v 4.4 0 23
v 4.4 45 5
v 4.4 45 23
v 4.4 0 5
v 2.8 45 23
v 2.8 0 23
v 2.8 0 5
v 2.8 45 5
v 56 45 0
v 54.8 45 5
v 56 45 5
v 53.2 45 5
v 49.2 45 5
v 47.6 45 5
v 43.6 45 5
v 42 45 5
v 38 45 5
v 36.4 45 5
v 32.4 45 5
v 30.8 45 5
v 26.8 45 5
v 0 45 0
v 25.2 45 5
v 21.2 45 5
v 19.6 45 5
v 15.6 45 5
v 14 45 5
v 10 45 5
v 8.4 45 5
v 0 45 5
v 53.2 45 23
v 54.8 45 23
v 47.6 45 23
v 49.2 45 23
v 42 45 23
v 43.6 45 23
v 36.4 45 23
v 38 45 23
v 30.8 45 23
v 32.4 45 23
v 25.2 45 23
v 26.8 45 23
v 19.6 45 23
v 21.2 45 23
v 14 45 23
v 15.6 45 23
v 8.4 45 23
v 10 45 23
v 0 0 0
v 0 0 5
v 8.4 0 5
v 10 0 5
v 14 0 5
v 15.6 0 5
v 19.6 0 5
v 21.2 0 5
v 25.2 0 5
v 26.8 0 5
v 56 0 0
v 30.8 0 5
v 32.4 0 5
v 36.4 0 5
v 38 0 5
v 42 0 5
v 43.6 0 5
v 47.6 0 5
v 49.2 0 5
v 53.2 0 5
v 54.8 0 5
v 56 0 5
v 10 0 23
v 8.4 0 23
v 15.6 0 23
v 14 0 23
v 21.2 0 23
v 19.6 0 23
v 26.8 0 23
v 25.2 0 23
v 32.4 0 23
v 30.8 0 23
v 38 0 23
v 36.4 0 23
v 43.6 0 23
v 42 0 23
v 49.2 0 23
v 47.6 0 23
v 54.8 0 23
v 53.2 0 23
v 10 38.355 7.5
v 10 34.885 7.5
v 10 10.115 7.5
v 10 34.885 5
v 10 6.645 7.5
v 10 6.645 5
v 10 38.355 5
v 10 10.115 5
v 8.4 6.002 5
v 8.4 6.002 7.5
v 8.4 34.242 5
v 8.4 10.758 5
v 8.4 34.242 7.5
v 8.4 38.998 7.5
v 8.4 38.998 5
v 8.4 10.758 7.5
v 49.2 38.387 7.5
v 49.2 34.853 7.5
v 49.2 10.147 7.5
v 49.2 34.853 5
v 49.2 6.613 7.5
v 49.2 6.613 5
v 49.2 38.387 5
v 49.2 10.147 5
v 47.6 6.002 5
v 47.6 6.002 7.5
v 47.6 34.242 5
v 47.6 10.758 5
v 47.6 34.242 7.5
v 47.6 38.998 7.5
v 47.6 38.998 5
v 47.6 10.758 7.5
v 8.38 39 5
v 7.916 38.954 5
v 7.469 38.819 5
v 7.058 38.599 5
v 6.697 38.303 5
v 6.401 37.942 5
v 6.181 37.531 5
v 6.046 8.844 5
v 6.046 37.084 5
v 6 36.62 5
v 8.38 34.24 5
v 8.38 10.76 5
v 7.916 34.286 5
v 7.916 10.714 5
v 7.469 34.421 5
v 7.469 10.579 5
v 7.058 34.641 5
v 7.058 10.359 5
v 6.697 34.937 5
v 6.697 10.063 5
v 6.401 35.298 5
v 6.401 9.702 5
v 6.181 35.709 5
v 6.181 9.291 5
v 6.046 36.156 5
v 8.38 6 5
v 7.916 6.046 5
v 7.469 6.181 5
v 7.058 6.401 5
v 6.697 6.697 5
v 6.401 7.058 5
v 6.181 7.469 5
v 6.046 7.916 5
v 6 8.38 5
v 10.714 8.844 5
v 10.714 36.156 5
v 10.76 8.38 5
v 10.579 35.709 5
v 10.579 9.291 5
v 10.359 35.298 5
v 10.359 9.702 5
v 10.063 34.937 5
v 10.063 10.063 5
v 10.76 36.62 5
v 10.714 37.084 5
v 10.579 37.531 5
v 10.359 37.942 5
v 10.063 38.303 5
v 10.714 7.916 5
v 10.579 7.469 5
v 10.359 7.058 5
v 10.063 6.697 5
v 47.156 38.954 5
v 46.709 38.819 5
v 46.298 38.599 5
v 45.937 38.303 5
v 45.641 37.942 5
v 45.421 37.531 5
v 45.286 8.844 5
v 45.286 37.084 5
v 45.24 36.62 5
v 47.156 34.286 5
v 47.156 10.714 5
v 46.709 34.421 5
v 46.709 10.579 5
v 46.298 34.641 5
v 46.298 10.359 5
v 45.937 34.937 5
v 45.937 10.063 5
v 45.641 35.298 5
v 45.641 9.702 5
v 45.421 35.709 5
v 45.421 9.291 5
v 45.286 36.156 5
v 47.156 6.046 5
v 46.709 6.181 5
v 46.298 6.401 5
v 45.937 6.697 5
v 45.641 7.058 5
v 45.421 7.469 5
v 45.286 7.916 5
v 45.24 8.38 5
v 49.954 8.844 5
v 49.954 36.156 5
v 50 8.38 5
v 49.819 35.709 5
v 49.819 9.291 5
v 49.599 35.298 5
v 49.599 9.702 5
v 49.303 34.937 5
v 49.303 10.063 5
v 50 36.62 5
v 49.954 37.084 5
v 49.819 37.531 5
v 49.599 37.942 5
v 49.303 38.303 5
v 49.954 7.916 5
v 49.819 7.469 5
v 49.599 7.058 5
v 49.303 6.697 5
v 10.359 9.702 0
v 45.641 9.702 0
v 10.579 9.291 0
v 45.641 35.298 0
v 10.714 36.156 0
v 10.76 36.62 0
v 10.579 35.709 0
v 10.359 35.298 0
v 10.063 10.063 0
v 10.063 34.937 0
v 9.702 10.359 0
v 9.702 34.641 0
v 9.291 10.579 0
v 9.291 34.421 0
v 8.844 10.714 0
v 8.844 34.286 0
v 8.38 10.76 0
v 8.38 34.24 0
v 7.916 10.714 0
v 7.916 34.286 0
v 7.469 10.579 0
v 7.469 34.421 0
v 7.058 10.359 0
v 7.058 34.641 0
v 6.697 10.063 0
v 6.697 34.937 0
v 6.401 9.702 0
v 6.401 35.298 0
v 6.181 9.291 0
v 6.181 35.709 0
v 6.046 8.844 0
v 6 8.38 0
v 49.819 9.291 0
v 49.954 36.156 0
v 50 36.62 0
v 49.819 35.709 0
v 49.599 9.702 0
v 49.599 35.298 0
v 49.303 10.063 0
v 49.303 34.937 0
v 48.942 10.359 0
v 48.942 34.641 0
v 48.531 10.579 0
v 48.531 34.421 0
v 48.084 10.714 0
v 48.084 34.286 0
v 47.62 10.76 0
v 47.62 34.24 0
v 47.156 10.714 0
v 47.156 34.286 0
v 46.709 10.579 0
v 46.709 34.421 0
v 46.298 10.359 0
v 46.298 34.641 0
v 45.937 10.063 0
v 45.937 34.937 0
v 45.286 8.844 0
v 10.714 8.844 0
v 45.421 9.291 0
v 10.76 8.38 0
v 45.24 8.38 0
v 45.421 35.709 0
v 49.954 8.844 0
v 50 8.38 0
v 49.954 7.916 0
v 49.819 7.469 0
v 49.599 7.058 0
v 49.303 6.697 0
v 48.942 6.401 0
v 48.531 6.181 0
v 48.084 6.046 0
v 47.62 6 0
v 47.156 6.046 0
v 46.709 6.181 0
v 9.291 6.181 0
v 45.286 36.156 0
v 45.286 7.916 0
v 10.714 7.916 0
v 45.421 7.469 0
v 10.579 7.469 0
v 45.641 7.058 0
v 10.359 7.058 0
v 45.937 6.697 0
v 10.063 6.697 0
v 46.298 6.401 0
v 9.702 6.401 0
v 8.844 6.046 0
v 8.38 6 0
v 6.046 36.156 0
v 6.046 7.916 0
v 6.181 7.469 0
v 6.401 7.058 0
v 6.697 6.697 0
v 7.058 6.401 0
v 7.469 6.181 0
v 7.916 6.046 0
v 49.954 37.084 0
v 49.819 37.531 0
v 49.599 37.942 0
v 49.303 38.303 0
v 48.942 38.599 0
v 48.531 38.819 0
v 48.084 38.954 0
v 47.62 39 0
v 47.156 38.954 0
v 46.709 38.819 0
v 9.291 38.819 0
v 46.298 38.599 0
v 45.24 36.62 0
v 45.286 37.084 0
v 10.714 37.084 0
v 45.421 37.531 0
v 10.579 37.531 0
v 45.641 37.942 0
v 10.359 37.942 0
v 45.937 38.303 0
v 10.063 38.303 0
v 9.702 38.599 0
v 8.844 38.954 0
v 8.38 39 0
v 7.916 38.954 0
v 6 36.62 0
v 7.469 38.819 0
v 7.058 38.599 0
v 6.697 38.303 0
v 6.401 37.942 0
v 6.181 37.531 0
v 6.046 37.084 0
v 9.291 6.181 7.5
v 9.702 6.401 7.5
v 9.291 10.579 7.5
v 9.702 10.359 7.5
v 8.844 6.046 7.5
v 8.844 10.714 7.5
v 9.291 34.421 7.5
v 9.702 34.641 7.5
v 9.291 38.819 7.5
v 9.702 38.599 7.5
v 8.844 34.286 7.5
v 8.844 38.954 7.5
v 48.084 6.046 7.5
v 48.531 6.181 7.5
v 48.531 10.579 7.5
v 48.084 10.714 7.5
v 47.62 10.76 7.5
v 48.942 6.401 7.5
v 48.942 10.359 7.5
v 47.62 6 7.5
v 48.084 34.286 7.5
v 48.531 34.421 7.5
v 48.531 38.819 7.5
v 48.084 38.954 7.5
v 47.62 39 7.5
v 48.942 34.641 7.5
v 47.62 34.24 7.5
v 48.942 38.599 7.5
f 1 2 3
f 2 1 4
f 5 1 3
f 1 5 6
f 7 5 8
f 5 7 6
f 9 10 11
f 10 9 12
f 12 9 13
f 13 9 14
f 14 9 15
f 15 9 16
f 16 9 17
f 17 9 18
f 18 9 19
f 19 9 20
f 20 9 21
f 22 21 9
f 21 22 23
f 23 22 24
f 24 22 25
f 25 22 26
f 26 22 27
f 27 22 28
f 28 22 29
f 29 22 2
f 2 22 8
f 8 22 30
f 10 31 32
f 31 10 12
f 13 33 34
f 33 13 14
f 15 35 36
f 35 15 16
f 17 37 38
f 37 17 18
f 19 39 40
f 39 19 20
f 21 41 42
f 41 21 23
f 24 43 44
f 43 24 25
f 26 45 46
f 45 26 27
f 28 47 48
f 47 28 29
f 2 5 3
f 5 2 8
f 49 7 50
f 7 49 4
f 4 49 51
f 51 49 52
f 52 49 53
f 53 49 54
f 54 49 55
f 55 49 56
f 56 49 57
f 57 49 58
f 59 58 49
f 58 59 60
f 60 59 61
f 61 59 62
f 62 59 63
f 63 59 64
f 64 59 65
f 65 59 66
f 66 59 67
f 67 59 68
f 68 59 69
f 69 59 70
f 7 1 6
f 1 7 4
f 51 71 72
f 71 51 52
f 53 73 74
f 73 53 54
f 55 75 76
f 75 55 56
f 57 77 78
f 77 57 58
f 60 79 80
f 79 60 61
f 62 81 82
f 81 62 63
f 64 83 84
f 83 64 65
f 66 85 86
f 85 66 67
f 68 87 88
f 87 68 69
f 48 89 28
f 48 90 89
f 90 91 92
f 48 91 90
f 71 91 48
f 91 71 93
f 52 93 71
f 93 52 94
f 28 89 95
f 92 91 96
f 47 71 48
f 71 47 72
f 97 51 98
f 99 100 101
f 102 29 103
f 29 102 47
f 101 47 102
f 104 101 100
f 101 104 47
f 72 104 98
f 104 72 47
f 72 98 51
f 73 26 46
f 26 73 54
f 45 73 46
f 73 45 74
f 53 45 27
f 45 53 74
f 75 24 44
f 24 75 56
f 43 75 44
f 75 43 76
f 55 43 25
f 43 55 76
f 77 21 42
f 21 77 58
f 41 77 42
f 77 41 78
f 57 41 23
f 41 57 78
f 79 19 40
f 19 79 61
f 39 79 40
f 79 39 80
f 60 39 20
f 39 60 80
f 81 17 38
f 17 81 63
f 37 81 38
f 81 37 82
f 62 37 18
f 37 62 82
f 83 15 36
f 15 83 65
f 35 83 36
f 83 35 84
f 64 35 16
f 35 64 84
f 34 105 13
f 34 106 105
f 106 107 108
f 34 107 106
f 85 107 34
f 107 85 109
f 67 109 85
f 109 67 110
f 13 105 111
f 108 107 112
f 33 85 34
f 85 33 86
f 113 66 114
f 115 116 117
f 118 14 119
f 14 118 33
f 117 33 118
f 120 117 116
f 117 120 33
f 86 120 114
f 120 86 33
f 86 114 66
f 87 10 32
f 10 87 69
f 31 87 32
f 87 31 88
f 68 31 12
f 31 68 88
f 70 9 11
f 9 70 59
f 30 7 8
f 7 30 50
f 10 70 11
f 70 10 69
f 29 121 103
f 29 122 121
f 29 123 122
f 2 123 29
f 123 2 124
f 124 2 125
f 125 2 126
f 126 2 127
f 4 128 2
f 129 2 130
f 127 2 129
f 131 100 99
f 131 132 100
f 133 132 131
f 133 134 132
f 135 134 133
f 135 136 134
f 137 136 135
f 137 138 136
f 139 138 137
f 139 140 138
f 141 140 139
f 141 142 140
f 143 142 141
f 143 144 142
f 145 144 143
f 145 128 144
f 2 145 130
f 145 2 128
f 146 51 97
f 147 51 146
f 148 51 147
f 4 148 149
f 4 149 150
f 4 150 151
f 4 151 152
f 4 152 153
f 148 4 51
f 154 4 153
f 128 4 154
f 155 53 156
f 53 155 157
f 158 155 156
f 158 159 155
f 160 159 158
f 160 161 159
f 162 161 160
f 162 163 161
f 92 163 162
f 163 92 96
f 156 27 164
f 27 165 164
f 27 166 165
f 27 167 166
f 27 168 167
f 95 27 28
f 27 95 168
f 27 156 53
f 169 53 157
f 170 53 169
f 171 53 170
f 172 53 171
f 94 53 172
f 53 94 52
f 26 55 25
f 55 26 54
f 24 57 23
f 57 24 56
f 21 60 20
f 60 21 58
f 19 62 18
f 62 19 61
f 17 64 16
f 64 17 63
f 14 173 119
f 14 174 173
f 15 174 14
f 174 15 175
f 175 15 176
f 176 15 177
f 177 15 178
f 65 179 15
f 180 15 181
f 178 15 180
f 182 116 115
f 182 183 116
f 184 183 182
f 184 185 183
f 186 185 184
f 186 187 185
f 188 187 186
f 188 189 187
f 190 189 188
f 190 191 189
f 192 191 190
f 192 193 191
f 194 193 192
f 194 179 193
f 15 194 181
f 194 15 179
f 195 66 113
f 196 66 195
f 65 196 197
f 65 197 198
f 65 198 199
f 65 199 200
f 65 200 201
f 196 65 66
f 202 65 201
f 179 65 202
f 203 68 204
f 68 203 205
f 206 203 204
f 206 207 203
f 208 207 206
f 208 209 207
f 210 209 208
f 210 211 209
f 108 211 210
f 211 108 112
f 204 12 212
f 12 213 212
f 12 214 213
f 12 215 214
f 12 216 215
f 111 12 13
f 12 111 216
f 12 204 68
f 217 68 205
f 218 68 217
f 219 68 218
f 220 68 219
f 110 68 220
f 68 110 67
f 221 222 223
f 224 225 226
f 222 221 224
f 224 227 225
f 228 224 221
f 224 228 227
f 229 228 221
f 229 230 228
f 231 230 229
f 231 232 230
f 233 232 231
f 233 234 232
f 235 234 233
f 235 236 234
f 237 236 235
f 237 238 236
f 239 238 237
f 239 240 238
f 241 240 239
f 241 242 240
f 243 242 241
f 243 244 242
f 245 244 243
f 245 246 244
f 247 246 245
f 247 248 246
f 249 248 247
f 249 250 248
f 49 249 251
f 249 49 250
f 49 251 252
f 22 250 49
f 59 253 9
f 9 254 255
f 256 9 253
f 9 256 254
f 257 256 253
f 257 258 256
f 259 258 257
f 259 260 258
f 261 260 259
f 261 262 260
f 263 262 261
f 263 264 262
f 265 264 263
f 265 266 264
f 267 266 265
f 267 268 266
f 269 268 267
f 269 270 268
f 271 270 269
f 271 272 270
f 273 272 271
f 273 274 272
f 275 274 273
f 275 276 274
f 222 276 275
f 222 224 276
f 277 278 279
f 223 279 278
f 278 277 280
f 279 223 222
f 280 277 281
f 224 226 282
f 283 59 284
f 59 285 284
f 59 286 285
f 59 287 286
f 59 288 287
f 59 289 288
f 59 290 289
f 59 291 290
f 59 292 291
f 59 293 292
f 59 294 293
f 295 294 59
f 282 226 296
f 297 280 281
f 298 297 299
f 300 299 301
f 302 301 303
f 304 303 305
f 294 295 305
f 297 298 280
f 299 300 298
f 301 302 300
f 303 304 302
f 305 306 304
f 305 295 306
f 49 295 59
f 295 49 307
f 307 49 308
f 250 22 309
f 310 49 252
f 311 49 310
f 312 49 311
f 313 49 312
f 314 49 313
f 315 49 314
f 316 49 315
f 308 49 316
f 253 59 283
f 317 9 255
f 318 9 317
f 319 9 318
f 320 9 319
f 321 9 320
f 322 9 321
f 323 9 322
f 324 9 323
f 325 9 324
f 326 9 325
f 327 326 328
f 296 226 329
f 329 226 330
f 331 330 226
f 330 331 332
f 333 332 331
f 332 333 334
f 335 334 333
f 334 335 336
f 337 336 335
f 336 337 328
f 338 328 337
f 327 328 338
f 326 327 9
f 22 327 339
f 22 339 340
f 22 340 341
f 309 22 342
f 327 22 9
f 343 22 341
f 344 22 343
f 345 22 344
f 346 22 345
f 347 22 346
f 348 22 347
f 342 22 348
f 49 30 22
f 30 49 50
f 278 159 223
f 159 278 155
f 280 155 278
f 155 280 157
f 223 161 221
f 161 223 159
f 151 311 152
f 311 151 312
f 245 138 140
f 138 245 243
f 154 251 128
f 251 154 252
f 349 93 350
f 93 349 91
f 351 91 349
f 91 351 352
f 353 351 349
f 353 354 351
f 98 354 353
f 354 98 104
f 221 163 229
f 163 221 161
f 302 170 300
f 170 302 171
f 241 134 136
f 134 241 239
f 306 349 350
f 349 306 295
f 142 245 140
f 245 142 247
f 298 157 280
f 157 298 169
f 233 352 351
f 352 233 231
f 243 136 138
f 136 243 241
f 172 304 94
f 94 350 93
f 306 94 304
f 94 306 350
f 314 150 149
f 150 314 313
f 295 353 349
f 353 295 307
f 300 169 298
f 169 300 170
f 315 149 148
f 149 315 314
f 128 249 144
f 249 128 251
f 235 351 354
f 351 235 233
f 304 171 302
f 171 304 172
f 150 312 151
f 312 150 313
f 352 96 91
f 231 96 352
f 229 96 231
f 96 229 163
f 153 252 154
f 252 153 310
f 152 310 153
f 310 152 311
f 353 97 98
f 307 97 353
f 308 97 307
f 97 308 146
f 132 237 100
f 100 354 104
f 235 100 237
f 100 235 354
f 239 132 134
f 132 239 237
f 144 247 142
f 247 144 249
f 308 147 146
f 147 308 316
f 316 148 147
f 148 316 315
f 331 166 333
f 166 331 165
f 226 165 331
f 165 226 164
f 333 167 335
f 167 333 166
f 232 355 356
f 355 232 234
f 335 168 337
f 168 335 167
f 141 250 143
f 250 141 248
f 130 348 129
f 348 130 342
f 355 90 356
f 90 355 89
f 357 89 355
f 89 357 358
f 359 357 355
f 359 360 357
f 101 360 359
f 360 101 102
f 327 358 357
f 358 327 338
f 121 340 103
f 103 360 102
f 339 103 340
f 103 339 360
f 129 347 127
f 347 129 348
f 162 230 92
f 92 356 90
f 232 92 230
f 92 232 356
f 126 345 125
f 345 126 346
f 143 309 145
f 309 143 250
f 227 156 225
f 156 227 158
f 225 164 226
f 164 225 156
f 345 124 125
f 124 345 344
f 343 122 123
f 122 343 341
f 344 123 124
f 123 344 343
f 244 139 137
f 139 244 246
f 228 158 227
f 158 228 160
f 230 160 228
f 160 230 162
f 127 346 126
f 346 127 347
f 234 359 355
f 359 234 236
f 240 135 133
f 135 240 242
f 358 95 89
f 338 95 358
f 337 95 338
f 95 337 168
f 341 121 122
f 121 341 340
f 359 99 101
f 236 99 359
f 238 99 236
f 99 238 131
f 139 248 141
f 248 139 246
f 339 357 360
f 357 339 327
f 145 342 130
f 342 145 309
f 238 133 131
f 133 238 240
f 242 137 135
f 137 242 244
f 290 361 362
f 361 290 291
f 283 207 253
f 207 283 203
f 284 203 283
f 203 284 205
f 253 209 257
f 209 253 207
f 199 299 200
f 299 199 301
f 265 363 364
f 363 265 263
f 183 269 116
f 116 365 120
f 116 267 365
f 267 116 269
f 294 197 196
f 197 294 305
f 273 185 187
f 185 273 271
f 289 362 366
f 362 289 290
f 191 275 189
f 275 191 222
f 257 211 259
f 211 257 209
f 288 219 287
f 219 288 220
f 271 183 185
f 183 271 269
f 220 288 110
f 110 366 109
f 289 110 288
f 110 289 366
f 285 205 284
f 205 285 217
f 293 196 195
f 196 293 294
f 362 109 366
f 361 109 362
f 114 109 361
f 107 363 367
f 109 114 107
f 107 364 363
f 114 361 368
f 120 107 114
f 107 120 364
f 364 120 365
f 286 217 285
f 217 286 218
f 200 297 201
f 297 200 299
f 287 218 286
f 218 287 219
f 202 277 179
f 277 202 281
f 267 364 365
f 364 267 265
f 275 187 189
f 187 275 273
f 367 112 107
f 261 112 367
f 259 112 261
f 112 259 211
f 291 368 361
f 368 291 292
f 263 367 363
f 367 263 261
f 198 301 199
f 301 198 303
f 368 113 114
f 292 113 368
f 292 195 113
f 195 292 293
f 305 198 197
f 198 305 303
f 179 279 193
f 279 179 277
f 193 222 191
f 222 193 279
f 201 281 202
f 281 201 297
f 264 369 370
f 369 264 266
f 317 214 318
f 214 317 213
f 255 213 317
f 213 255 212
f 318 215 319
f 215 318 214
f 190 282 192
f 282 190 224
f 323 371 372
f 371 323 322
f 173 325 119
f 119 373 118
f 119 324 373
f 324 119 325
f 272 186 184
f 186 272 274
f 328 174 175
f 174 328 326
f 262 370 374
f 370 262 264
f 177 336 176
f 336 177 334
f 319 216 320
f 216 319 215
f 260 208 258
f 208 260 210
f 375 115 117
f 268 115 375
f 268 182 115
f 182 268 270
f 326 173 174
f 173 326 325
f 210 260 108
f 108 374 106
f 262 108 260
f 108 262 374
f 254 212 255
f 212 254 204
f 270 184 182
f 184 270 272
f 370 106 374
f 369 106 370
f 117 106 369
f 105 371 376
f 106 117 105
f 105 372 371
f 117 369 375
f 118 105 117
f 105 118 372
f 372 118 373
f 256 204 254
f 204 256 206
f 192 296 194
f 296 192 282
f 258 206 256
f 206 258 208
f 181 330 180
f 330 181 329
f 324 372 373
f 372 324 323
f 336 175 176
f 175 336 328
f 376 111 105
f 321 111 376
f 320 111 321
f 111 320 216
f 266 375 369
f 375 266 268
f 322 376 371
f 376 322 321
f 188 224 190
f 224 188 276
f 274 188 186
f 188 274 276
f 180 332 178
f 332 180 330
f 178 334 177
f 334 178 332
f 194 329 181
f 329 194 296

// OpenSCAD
$fn = 32;

// ----------------------------------------------------------------------
// Finned heat sink: 56 x 45 mm base, 18 mm fins
// ----------------------------------------------------------------------

// --- parameters (mm) ---
base_w = 56;              // base width
base_d = 45;              // base depth
base_t = 5;               // base thickness
fin_h = 18;               // fin height above the base
holes_d = 4.76;           // fixing holes
hole_x = 19.62;           // hole offset in x
hole_y = 14.12;           // hole offset in y
fin_t = 1.6;              // fin thickness
fin_pitch = 5.6;          // fin pitch
fin_count = 10;           // number of fins
fin_x0 = 2.8;             // first fin offset

difference() {
  union() {
    cube([base_w, base_d, base_t]);
    for (i = [0 : fin_count - 1]) {
      translate([fin_x0 + i * fin_pitch, 0, base_t - 0.5]) cube([fin_t, base_d, fin_h + 0.5]);
    }
  }
  /* fixing holes through the base, 2.5 mm clear on both sides */
  for (hx = [-19.62, 19.62]) {
    for (hy = [-14.12, 14.12]) {
      translate([base_w / 2 + hx, base_d / 2 + hy, -2.5]) cylinder(h = base_t + 5, d = holes_d);
    }
  }
}
